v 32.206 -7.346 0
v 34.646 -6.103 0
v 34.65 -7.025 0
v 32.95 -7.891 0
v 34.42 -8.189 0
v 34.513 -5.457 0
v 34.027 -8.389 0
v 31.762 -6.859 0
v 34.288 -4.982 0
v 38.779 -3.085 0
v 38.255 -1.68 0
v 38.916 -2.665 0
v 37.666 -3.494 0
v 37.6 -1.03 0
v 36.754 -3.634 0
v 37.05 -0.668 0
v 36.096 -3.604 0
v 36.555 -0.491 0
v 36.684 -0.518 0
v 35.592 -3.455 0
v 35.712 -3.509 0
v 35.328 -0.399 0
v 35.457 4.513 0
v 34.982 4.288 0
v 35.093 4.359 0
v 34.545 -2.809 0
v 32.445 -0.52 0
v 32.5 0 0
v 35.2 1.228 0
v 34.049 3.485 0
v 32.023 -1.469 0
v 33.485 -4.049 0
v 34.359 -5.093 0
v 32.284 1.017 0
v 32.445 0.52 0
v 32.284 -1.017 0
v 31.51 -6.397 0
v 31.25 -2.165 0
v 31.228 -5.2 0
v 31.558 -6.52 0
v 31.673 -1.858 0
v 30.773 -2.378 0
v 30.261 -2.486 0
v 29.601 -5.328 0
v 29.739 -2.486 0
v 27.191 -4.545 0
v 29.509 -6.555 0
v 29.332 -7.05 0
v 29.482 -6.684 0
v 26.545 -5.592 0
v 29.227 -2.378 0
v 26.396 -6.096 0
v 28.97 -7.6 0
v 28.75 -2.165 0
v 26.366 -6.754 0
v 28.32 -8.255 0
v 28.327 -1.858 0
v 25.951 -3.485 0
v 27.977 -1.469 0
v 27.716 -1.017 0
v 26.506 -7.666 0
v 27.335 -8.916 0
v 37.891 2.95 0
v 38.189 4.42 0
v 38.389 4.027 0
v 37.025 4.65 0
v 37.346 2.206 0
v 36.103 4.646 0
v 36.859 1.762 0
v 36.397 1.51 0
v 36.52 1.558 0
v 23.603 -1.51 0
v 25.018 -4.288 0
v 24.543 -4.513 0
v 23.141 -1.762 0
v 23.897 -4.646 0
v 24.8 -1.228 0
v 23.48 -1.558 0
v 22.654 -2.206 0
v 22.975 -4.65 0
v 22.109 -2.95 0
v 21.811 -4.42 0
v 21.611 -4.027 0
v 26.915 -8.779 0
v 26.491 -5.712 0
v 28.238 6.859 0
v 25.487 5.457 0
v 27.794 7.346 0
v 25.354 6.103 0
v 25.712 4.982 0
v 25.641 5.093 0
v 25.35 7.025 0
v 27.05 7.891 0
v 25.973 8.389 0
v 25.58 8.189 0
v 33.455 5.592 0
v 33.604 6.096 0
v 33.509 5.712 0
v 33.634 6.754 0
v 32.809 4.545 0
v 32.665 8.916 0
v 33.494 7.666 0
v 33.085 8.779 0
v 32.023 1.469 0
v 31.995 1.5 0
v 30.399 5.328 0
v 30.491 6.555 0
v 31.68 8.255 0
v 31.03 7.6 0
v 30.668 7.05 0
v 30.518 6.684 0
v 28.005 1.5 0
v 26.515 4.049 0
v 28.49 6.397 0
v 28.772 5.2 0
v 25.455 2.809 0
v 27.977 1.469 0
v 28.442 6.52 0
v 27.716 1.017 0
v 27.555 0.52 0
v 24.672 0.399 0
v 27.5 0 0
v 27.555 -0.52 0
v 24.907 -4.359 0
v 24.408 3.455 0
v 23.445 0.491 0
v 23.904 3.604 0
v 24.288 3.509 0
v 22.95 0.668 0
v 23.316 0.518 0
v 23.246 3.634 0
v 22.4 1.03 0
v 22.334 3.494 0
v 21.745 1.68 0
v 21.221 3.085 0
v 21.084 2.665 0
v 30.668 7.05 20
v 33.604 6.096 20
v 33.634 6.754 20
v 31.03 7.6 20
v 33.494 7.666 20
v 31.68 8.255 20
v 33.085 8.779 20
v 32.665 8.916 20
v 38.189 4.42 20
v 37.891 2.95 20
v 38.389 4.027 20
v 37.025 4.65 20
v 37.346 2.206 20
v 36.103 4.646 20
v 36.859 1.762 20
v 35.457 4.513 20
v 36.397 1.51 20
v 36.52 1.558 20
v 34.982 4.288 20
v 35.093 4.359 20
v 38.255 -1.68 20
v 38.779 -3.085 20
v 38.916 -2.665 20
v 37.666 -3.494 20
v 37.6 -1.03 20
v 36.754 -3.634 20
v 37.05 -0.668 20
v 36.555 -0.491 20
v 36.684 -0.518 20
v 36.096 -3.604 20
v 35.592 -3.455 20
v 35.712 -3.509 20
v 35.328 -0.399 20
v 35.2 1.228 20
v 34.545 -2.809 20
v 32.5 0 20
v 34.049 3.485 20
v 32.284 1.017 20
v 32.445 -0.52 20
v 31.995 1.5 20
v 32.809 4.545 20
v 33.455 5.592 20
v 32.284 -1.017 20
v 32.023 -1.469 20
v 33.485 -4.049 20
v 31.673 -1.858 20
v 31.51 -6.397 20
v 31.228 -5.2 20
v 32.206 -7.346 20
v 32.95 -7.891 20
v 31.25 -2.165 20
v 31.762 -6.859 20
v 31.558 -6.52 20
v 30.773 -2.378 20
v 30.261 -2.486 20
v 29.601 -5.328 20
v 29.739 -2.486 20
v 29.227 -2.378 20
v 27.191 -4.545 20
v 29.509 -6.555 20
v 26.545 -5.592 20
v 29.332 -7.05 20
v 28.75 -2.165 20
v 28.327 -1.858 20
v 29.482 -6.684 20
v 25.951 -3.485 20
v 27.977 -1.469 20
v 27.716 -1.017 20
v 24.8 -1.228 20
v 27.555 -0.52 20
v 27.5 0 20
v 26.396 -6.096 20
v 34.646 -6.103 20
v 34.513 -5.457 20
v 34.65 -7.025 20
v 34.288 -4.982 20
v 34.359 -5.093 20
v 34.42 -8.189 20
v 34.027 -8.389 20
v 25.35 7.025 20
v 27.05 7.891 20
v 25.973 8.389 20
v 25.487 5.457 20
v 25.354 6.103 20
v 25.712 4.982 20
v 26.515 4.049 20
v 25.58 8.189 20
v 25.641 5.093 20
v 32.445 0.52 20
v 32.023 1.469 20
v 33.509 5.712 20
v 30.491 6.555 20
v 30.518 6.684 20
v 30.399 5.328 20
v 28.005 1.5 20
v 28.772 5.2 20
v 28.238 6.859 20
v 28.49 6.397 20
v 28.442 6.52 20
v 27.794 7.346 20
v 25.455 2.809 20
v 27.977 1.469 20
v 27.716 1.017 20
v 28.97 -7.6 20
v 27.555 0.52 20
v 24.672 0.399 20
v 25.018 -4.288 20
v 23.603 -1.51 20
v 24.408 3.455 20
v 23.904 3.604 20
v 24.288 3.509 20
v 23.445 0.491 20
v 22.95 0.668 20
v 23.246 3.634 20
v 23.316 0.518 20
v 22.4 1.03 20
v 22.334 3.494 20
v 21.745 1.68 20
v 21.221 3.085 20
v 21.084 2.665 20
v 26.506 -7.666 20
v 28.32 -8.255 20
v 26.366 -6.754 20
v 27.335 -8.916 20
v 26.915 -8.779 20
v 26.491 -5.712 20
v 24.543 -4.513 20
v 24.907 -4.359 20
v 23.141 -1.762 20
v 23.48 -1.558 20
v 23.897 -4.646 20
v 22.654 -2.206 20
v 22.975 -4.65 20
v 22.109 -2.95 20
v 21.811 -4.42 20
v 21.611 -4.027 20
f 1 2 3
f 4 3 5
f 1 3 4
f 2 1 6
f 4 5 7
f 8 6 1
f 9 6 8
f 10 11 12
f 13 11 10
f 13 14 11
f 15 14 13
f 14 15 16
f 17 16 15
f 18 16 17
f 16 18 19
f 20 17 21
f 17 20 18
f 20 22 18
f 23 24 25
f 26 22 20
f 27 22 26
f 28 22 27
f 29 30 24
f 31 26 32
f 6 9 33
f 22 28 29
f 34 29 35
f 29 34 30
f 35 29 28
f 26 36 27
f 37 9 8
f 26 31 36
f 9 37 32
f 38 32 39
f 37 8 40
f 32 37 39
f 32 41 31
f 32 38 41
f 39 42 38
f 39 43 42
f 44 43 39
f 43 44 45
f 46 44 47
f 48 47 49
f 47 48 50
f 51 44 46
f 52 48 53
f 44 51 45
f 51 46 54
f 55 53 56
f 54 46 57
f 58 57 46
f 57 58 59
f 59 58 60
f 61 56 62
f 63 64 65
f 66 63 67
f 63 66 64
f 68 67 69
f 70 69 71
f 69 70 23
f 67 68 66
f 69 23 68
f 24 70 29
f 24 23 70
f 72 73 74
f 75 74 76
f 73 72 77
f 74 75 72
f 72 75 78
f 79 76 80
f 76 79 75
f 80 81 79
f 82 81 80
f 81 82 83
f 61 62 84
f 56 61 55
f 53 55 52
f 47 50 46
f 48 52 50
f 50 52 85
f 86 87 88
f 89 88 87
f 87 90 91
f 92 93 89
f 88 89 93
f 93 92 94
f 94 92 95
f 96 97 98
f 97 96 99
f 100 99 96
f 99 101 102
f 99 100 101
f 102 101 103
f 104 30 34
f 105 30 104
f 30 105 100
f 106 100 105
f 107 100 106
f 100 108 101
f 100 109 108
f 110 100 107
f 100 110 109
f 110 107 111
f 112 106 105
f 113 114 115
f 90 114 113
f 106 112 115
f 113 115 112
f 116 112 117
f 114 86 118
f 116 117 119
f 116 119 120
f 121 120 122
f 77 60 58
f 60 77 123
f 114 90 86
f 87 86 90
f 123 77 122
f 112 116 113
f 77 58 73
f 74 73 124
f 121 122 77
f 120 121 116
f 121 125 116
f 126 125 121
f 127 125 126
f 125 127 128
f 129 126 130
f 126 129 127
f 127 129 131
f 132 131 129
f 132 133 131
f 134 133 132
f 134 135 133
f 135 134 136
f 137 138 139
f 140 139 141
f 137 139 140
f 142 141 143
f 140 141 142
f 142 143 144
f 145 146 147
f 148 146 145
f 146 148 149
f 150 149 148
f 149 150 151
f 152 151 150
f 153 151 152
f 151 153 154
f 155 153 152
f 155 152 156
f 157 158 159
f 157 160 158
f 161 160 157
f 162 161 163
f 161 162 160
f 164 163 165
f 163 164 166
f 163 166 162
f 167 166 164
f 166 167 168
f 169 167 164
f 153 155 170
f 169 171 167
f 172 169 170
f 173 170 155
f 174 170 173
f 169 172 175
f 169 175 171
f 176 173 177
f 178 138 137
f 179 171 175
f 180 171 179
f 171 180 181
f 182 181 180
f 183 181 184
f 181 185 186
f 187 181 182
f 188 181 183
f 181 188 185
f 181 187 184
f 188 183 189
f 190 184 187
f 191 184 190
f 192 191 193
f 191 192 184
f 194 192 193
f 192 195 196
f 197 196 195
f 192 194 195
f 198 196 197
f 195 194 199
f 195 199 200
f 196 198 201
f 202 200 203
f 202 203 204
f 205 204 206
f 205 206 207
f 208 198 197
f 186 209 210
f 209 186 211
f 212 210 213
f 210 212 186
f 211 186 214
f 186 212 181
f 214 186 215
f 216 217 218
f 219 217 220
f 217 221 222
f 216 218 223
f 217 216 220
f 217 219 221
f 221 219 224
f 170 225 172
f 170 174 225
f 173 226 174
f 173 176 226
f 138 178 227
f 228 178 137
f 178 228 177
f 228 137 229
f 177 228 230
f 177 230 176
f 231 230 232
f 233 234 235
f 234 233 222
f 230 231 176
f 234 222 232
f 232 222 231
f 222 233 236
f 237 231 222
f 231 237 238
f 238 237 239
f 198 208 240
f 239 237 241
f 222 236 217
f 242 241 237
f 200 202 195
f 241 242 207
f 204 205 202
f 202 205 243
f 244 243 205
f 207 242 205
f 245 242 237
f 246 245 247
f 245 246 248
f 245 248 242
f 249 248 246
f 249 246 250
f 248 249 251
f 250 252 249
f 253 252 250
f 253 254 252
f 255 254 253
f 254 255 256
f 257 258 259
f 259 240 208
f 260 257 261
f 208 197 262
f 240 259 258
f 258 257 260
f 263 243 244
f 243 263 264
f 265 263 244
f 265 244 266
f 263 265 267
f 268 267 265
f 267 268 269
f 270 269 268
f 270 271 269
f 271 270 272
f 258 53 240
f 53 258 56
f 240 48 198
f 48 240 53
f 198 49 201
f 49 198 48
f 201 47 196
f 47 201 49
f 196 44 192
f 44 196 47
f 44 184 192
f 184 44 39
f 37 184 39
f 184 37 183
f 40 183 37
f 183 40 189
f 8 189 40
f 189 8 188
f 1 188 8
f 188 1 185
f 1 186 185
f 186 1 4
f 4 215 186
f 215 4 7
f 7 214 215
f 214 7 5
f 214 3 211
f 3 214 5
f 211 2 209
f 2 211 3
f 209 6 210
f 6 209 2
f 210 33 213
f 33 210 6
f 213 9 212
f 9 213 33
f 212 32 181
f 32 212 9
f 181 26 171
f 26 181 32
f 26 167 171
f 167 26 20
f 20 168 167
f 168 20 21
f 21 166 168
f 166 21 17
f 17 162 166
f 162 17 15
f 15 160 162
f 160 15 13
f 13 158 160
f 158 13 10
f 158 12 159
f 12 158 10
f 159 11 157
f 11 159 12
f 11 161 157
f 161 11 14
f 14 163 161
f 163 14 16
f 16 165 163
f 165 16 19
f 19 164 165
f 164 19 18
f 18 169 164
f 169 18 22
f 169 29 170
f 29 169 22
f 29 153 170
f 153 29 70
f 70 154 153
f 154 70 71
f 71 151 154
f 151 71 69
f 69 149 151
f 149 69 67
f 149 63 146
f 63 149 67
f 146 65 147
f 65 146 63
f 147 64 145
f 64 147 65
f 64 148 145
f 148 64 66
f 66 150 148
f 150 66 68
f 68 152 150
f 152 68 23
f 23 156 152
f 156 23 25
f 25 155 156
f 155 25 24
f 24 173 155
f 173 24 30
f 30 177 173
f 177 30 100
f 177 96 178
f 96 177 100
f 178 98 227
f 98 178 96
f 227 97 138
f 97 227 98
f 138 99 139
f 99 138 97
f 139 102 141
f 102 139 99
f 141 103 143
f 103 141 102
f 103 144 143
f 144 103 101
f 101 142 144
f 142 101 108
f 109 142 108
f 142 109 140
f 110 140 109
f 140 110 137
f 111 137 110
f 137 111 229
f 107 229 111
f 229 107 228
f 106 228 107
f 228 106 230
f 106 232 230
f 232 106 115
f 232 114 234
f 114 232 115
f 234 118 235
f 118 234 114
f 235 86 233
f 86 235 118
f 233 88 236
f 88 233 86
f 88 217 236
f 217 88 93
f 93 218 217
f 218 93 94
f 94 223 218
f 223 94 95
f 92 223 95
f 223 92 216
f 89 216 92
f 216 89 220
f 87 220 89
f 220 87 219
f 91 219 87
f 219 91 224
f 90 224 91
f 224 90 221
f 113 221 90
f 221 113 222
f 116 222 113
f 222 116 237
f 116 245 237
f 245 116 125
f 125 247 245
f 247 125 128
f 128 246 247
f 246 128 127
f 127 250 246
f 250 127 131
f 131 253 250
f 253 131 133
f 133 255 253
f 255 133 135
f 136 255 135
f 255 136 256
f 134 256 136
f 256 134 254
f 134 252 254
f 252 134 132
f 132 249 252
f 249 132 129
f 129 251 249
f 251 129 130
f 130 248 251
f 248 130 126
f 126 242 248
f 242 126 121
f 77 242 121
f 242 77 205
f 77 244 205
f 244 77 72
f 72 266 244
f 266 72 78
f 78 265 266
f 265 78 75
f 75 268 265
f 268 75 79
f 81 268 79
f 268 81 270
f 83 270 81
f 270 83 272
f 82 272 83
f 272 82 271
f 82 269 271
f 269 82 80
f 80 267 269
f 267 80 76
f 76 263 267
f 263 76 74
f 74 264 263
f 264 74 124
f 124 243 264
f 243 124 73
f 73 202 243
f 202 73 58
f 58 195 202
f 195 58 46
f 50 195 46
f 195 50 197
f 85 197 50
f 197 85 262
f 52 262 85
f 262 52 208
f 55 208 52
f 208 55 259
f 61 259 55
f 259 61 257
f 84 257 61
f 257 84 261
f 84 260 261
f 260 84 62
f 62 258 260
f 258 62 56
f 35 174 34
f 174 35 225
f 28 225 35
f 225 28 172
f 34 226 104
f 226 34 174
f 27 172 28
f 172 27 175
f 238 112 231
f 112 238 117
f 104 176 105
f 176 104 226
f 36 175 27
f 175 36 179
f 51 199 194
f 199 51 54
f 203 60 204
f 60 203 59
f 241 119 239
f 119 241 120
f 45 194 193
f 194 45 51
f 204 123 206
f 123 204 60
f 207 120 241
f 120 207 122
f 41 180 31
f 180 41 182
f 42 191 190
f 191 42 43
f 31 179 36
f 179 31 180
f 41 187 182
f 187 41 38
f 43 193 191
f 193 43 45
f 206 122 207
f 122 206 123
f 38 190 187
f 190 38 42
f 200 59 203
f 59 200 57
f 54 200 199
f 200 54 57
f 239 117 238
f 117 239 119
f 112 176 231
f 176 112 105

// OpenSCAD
// PRUSA iteration3
// NEMA 17 extruder small gear
// GNU GPL v3
// Josef Průša <iam@josefprusa.cz> and contributors
// http://www.reprap.org/wiki/Prusa_Mendel
// http://prusamendel.org


include <external_gear_script.scad>;

module small_gear()
{
	translate([0,0,0])
	{

		translate ([30,0,0])
		difference(){
			rotate ([0,0,360*-1/20]) gear (number_of_teeth=8,
			circular_pitch=335,rim_thickness=20,bore_diameter=0,hub_thickness=0);


			difference(){ 
				translate ([0,0,-1]) cylinder(r=5/2, h=25, $fn=30);
				translate ([-5,1.5,0])cube([10,10,30]);
			}
		}
	}
}

small_gear();
